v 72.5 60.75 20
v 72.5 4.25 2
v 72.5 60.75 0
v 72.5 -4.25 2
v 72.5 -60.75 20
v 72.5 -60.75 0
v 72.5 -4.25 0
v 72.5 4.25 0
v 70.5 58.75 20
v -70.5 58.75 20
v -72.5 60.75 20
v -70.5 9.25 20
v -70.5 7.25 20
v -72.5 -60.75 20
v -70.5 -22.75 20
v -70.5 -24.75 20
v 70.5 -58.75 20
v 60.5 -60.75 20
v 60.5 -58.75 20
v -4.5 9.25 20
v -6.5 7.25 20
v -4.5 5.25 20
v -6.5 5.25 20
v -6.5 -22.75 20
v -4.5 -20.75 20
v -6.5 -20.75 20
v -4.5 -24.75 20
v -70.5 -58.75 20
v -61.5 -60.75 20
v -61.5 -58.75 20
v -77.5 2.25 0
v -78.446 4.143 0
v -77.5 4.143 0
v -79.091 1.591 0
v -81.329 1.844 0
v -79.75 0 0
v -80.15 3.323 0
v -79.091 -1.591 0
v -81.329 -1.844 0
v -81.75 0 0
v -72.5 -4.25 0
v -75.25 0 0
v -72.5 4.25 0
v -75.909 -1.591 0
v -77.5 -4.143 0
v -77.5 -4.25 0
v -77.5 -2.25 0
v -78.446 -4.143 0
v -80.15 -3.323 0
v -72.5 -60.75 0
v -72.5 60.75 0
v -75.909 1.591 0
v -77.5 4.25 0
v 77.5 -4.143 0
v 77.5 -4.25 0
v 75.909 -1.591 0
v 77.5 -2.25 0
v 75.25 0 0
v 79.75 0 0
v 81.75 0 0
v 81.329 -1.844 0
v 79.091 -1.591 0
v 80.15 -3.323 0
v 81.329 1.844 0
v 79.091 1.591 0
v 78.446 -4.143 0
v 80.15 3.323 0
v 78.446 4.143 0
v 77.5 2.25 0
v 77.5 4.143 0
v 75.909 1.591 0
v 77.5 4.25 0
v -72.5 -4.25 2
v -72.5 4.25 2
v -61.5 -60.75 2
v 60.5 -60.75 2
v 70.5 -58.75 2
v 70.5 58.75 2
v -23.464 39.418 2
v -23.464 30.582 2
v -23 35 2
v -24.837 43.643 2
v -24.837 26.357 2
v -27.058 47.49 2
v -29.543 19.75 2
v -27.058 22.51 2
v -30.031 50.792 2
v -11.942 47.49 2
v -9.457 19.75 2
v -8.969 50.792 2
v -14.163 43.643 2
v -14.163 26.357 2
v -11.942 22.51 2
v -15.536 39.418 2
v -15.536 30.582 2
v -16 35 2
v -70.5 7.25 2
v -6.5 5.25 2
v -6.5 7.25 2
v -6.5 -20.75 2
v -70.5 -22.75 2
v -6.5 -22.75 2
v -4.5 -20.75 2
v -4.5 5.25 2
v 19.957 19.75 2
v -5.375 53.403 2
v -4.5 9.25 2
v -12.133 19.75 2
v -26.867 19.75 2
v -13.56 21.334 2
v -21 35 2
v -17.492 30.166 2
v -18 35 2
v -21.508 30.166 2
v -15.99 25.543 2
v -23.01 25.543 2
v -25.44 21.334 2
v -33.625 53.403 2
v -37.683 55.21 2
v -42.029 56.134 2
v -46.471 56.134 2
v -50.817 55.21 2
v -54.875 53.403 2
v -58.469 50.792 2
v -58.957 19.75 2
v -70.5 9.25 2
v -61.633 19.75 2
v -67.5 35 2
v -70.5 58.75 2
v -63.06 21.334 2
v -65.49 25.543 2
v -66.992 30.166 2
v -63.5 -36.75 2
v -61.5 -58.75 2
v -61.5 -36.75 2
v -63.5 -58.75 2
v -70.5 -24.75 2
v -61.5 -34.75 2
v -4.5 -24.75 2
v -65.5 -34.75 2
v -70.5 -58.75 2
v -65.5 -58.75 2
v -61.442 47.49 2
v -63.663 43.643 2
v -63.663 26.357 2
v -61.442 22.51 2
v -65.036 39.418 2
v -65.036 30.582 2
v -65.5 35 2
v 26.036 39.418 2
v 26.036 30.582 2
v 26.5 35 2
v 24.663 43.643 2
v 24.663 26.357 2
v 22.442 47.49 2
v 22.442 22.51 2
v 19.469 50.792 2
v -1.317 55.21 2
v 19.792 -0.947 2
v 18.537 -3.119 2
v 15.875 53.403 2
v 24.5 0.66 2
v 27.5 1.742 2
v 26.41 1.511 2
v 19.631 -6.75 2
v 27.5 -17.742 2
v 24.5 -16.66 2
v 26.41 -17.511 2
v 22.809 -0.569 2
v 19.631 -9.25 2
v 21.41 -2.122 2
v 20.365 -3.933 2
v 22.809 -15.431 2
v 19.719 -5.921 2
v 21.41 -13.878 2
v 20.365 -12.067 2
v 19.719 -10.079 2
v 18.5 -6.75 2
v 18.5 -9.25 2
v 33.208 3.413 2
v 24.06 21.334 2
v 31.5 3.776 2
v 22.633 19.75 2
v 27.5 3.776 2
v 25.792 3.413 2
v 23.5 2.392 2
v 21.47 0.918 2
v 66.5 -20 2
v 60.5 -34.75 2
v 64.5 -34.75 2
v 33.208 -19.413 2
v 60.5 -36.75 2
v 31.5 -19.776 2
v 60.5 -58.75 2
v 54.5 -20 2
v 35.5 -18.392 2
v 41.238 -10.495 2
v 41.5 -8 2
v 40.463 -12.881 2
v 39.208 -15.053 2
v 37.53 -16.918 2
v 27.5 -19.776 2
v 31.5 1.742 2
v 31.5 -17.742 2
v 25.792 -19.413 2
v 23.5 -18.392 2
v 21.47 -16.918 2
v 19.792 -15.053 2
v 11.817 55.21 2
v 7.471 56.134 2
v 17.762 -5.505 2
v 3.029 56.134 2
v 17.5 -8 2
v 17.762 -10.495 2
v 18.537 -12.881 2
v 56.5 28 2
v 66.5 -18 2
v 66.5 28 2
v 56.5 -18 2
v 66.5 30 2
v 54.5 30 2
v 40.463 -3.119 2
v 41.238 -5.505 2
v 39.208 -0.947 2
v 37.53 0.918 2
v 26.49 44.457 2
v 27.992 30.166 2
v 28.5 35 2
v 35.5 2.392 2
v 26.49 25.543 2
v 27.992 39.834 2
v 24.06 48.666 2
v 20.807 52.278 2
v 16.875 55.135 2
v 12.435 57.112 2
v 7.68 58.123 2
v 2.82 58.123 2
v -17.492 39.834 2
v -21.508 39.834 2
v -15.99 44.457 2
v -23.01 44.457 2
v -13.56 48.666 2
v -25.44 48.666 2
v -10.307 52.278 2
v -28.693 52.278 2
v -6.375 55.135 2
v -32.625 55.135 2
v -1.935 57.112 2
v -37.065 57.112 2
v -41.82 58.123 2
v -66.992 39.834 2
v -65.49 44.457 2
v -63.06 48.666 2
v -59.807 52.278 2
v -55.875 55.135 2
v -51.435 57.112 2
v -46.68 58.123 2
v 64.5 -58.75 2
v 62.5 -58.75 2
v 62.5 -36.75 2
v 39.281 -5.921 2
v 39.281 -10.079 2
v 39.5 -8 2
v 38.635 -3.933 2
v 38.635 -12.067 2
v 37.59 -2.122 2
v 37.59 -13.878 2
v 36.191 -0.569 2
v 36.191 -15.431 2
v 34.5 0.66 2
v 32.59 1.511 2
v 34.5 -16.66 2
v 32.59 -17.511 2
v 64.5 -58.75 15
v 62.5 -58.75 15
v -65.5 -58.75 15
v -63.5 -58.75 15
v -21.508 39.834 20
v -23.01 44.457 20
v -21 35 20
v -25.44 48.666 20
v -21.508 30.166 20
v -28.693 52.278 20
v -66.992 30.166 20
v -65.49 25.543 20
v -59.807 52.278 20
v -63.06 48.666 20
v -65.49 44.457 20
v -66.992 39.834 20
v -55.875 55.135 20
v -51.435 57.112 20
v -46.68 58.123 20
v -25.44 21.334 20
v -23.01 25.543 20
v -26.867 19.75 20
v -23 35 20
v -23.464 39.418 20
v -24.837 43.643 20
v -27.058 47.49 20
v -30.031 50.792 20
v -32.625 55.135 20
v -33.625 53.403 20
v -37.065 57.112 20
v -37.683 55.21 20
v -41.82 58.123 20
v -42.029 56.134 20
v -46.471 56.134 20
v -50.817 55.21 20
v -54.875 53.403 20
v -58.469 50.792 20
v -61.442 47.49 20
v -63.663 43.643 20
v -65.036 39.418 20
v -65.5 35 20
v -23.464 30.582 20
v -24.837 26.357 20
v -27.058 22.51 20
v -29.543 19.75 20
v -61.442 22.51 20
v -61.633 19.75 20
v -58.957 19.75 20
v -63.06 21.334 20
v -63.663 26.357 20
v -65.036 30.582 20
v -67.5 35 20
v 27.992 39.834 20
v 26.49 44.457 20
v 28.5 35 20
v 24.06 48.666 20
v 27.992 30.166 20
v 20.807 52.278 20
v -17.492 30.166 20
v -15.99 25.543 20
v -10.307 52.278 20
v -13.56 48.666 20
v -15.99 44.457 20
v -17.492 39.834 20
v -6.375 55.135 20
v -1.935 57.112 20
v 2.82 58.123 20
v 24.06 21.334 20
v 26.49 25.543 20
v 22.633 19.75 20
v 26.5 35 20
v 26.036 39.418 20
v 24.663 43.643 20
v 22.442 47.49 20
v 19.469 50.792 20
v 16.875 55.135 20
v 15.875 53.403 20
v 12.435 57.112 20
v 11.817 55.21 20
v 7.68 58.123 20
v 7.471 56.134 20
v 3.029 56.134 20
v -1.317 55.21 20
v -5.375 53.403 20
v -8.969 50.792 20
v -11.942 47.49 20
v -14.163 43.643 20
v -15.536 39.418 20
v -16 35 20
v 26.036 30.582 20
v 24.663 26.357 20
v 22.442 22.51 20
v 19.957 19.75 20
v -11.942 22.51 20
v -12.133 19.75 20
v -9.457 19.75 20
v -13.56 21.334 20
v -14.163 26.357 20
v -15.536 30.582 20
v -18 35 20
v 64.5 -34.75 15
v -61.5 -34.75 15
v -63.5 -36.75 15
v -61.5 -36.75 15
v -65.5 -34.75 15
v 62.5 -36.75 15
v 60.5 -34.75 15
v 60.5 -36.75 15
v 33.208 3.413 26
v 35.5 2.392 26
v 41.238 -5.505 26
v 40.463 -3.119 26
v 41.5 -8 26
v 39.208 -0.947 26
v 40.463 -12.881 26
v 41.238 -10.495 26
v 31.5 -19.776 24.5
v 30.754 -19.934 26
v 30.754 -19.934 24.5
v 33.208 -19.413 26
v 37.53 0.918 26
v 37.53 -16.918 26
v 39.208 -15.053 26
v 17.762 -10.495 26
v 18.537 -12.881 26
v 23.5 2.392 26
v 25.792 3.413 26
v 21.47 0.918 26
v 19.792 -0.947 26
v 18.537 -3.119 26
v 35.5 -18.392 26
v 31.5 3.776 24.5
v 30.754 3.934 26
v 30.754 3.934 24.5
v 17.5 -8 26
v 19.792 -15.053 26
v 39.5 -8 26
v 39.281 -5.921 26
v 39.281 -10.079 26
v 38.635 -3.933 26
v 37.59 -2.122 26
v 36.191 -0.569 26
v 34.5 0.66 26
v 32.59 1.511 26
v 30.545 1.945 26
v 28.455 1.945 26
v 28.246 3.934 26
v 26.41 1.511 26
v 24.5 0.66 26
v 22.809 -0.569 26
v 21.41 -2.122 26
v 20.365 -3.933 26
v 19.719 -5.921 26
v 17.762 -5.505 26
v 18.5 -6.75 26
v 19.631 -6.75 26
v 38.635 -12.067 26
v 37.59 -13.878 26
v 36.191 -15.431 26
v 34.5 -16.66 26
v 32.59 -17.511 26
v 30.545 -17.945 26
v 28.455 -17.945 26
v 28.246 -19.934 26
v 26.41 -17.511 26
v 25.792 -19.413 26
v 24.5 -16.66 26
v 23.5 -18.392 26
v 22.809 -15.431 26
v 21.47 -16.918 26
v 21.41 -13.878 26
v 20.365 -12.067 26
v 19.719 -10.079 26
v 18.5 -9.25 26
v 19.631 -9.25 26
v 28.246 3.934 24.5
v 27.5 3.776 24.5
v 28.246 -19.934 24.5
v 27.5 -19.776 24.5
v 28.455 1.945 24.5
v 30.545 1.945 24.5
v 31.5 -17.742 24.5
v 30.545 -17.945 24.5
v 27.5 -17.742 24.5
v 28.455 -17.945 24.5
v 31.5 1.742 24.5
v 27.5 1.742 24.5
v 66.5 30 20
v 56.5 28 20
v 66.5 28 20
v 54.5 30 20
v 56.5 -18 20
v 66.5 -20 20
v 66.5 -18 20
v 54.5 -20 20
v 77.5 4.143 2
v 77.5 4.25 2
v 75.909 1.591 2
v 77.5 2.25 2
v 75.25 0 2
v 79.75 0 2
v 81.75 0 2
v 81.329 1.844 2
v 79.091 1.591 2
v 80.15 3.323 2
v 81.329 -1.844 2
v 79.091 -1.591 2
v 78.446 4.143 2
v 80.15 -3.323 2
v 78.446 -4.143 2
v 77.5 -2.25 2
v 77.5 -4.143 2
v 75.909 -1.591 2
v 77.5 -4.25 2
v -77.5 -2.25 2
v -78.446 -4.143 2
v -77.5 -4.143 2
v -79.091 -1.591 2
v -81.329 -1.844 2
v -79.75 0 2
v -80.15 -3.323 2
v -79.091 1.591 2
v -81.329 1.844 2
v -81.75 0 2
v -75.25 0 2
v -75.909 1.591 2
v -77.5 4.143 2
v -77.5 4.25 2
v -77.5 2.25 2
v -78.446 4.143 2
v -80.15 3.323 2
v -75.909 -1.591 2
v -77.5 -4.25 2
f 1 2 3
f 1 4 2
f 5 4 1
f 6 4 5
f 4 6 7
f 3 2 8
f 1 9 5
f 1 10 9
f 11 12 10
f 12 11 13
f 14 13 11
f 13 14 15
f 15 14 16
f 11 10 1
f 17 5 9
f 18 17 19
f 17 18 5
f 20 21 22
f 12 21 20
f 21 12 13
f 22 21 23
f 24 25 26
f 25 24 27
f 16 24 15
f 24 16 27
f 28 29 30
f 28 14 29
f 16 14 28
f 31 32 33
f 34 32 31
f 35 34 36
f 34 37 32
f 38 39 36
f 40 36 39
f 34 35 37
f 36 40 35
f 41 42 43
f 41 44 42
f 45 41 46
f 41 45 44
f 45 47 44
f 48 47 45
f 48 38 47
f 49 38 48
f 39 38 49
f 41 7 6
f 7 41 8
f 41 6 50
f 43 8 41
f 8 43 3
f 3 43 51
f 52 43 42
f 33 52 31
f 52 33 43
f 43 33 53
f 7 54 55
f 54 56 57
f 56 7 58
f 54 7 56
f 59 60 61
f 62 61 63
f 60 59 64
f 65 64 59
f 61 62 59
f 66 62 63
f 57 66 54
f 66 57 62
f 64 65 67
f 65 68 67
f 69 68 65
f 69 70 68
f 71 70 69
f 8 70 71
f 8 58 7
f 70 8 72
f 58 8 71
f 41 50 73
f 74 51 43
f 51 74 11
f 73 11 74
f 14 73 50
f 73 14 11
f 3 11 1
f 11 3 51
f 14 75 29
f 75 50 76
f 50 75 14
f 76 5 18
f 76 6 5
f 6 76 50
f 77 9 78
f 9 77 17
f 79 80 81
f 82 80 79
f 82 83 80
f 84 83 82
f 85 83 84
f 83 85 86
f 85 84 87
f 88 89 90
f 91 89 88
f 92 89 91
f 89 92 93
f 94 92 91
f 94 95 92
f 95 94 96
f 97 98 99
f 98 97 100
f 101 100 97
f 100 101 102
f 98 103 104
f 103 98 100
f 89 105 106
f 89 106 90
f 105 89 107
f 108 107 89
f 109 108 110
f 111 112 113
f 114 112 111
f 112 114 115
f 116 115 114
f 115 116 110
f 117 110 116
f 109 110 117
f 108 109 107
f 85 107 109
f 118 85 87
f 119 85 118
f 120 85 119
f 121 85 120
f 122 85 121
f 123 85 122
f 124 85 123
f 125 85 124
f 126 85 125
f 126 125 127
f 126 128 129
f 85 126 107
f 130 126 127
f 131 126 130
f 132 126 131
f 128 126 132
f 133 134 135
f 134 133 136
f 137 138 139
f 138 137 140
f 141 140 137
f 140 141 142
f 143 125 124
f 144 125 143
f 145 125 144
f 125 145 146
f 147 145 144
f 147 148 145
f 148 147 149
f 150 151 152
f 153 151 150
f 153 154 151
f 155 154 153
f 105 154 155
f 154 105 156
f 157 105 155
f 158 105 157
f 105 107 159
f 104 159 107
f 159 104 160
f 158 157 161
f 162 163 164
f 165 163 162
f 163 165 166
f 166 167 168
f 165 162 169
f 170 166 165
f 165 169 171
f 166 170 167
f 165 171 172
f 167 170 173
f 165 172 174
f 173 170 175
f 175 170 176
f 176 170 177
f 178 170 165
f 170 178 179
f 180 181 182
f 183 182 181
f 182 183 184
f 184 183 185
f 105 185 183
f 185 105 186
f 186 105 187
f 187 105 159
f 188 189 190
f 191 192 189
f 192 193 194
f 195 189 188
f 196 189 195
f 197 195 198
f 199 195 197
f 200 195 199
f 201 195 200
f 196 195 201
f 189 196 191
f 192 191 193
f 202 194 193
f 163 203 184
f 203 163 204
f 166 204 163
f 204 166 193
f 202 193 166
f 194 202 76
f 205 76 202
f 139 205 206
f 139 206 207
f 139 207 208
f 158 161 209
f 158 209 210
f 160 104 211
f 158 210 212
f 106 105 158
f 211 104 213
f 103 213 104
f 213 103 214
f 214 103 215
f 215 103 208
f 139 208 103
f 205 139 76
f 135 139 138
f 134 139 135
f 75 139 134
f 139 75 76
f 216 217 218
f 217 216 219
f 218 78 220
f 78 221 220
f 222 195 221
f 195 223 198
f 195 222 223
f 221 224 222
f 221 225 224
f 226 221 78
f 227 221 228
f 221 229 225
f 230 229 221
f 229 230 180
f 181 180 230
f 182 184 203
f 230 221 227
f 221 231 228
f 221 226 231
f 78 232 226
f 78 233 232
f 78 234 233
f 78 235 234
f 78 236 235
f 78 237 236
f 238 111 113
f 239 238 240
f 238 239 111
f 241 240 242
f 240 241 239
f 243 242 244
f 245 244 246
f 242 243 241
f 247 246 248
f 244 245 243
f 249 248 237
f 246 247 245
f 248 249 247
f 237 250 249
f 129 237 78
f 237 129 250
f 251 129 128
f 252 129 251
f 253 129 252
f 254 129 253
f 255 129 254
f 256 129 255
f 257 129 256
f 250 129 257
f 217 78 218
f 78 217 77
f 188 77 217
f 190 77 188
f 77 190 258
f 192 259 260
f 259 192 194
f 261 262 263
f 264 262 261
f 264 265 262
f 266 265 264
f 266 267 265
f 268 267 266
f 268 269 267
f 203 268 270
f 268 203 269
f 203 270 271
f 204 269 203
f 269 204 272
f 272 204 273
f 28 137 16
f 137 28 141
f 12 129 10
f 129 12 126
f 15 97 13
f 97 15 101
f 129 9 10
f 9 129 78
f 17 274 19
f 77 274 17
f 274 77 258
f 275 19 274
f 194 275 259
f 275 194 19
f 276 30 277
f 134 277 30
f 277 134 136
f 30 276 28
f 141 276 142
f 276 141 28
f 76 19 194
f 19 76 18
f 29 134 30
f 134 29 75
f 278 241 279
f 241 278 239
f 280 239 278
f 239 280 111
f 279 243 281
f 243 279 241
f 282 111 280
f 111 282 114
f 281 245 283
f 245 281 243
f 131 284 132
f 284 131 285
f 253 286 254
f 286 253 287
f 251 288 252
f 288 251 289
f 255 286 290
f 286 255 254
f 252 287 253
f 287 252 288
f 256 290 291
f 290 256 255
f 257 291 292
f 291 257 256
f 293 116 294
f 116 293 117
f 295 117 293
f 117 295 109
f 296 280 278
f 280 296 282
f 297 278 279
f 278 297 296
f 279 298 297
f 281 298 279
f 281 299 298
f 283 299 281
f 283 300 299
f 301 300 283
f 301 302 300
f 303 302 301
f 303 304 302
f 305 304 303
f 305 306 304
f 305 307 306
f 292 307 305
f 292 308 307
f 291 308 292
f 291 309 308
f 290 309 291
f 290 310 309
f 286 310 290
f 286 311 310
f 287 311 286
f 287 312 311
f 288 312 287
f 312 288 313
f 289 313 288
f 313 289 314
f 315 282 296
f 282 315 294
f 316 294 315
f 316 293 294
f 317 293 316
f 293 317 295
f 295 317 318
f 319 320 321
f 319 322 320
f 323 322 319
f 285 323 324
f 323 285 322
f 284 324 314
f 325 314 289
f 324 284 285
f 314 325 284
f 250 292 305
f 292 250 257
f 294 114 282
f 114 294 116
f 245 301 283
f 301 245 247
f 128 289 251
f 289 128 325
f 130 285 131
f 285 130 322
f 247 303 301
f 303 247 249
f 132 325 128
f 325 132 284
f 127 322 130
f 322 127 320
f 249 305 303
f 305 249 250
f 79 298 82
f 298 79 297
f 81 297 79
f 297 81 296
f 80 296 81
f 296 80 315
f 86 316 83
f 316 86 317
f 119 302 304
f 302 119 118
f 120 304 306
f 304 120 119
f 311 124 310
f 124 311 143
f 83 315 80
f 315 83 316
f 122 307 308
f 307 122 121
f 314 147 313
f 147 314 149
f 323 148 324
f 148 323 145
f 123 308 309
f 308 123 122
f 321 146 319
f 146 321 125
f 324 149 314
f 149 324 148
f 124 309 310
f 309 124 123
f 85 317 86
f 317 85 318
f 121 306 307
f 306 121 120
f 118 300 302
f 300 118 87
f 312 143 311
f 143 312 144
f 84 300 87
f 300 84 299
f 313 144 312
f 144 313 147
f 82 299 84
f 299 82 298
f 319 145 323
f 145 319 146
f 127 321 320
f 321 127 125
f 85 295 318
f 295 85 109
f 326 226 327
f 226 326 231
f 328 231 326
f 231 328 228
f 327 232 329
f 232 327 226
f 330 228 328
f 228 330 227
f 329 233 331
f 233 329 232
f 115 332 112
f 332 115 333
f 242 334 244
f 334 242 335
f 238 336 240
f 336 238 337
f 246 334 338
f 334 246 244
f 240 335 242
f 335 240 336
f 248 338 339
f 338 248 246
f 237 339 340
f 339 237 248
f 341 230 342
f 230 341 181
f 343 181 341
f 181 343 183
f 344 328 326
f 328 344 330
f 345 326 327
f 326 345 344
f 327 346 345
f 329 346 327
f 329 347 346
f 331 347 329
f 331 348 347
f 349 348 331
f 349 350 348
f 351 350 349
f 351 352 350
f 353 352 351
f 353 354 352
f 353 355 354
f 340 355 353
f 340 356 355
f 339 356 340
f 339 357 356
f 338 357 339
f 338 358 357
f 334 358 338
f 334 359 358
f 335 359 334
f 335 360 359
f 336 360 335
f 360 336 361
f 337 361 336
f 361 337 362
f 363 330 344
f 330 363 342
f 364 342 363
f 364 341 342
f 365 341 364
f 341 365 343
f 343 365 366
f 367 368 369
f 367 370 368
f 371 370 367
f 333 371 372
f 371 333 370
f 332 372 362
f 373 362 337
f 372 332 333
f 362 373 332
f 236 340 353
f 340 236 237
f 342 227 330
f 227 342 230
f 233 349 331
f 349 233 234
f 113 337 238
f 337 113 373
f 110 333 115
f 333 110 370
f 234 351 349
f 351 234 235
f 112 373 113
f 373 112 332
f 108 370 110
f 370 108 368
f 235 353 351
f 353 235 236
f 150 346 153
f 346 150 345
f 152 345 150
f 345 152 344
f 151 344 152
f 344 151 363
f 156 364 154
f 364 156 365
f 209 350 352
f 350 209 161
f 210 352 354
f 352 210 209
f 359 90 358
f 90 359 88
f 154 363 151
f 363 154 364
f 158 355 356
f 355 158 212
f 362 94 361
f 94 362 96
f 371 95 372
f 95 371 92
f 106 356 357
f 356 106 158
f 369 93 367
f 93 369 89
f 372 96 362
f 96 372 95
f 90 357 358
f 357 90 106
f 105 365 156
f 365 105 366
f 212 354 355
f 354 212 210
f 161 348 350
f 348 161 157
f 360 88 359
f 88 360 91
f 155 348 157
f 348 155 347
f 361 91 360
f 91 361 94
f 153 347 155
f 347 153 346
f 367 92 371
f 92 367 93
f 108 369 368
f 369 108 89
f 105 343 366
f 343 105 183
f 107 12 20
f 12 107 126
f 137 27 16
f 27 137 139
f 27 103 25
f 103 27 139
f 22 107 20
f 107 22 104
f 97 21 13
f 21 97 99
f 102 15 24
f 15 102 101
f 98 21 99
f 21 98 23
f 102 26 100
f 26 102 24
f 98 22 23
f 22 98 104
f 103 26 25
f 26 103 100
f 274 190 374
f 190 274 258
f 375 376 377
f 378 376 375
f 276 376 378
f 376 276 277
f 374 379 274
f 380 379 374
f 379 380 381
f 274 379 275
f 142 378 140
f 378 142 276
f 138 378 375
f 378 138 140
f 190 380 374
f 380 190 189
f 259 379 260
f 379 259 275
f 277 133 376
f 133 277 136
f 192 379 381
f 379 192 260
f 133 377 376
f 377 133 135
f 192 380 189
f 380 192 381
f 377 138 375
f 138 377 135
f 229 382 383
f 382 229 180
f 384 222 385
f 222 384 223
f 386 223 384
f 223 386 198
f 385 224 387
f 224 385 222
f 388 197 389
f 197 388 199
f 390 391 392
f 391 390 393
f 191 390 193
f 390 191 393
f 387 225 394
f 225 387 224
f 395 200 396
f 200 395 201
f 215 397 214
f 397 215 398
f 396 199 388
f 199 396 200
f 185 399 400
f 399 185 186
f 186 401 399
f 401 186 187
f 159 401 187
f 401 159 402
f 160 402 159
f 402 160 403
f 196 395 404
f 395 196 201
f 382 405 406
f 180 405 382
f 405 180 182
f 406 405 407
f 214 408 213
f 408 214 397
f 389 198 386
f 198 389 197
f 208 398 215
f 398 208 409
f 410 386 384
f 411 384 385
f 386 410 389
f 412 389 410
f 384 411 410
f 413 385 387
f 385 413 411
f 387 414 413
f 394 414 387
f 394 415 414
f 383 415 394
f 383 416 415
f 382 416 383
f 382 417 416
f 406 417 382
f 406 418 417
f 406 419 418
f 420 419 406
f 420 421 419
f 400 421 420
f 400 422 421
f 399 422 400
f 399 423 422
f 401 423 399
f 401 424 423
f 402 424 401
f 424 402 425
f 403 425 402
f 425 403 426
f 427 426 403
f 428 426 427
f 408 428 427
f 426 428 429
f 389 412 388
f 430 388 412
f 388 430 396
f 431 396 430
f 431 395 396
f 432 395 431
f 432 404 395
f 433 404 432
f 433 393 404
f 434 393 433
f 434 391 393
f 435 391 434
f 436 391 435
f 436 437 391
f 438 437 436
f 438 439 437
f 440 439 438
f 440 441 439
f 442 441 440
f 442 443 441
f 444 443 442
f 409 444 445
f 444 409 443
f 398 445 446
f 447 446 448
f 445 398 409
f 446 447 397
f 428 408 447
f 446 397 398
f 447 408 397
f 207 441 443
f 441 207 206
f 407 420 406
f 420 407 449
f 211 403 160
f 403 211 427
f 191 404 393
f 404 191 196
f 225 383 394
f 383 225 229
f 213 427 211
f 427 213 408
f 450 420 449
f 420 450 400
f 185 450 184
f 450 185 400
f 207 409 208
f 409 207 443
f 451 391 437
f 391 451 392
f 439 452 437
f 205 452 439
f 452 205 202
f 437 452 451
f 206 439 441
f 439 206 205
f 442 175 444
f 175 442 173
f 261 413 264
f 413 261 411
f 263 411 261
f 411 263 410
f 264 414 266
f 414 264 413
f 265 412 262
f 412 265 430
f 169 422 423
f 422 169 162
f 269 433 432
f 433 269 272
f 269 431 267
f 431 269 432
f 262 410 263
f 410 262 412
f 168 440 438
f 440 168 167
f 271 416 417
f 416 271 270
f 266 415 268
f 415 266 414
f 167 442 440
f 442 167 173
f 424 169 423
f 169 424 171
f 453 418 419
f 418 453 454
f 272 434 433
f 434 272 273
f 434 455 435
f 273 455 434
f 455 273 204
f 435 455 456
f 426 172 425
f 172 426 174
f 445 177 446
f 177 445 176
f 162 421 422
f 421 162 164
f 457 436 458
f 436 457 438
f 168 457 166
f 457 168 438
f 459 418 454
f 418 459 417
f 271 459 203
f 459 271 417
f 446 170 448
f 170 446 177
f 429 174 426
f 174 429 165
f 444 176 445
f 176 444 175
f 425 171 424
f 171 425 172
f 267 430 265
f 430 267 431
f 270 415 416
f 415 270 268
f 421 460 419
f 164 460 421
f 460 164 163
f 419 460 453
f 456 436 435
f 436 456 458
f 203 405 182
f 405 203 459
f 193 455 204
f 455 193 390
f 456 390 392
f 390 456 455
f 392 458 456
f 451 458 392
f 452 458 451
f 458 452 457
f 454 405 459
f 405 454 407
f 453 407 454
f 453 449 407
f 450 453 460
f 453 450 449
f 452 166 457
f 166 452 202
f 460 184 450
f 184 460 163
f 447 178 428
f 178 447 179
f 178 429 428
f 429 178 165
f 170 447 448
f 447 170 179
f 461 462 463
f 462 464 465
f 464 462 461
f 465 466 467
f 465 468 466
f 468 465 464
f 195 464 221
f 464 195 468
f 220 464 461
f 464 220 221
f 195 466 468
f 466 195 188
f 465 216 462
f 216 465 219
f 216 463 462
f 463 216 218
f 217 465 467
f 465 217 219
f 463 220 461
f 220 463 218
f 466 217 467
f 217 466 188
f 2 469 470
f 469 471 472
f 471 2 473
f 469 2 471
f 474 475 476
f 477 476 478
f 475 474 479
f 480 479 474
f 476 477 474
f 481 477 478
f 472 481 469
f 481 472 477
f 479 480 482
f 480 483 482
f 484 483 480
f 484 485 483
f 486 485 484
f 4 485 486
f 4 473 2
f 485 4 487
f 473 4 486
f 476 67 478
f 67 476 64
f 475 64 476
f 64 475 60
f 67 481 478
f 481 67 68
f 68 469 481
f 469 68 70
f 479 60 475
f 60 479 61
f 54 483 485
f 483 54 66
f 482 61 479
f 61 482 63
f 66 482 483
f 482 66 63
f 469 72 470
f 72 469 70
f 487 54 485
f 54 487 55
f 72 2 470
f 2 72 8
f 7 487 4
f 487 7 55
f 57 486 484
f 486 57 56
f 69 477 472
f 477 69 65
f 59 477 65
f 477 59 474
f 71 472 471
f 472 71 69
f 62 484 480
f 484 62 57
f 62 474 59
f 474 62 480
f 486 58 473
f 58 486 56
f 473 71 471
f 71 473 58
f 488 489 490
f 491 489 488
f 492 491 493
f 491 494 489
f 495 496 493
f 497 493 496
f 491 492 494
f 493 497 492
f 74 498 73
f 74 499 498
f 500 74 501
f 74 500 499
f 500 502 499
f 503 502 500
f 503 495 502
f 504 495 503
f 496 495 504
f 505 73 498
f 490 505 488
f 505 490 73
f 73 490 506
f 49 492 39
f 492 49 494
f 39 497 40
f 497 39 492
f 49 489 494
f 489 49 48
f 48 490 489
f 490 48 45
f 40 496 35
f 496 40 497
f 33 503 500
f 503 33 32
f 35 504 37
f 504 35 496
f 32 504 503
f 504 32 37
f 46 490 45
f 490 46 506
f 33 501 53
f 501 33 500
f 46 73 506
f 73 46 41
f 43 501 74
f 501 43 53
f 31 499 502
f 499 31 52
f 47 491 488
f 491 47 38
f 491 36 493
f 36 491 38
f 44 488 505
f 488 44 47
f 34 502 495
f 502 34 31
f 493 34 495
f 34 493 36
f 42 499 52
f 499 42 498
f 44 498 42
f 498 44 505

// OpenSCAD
shelly_d = 42.5;
shelly_r = shelly_d / 2;
shelly_h = 20;
shelly_cut = 8;
power_w = 30;
power_l = 66;
power_h = 20;
spacing = 5;
shell = 2;
terminal_l = 126;
terminal_w = 22;
terminal_h = 15;
usb_l = 46;
usb_w = 14;
usb_cut = 4;
usb_h = shelly_h;

switch_d = 20;
switch_r = switch_d / 2;
switch_outer_r = switch_r + shell;
switch_outer_d = switch_outer_r * 2;
switch_cut = 4;
box_h = shelly_h;
switch_h = 26;
switch_notch_w = 2.5;
switch_notch_t = 1;
screw_d = 4.5;
screw_r = screw_d / 2;

//box_inner_l = shelly_d * 2 + spacing + 3 + shell * 5 + power_w;
box_inner_l = terminal_l + spacing * 3;
//box_inner_w = shelly_d + spacing + terminal_w;
box_inner_w = power_w + shelly_d - shelly_cut + terminal_w + spacing * 5 + shell * 3;

box_outer_l = box_inner_l + shell * 2;
box_outer_w = box_inner_w + shell * 2;

module switch() {
    translate([switch_outer_r + shell, switch_outer_r + shell, 0])
    difference() {
        cylinder(r = switch_outer_r, h = switch_h);
        cylinder(r = switch_r, h = switch_h + 1);
        translate([-switch_cut / 2, -switch_d, 0])
        cube([switch_cut, switch_d * 2, switch_h - 1.5]);
        translate([-switch_r - switch_notch_t, -switch_notch_w / 2, 0])
        cube([switch_notch_t * 2, switch_notch_w, switch_h * 2]);
    }
}

module box() {
  difference() {
    cube([box_outer_l, box_outer_w, box_h]);
    translate([shell, shell, shell])
    cube([box_inner_l, box_inner_w, box_h]);
    
    translate([shell * 3 + spacing, -0.1, shell]) 
    cube([terminal_l - shell * 2, shell * 2, box_h]);
  }
}

module shelly() {
    difference() {
        cylinder(h=shelly_h, r=shelly_r + shell);
        translate([0, 0, shell])
        cylinder(h=shelly_h, r=shelly_r);
        
    translate([-shelly_d, -shelly_r - shell, 0])
        cube([shelly_d * 2, shelly_cut, shelly_h + 1]);
    }
}

module power() {
    difference() {
        translate([0, -shell, 0])
        cube([power_w + shell * 2, power_l + shell, power_h]);
        translate([shell, 0, 0])
        cube([power_w, power_l + 2, power_h + 1]);
        translate([shell * 2, -power_l, 0])
        cube([power_w - shell * 2, power_l * 2, power_h + 1]);
    }
}

module terminal() {
    difference() {
        cube([terminal_l + shell * 2 , terminal_w + shell * 2, terminal_h]);
        translate([shell, -1, 0])
        cube([terminal_l, terminal_w + shell + 1, terminal_h + 1]);
        translate([shell * 2, -1, 0])
        cube([terminal_l - shell * 2, terminal_w + shell * 4, terminal_h + 1]);
    }
}

module usb() {
    difference() {
        cube([usb_w + shell * 2, usb_l + shell * 2, usb_h]);
        translate([shell, shell, 0])
        cube([usb_w, usb_l, usb_h * 2]);
        translate([usb_w - shell, -1, 0])
        cube([usb_cut, usb_l * 2, usb_h * 2]); 
    }
}

module screw_tab() {
    difference() {
        union() {
            translate([spacing, screw_r + shell, 0])
            cylinder(r=screw_r + shell, shell);
            cube([spacing, screw_d + + shell * 2, shell]);
        }
        
        translate([spacing, shell + screw_r, -1])
        cylinder(r=screw_r, h = shell + 2);
    }
}

translate([-box_outer_l / 2, -box_outer_w / 2, 0]) {
box();
translate([shelly_r + shell + spacing, terminal_w + power_w + shelly_r + shell * 4 + spacing * 4.5 - shelly_cut, 0]){
    shelly();
    translate([shelly_d + spacing + shell, 0, 0])
    shelly();
}


translate([power_l, terminal_w + shell * 2 + spacing * 2, 0])
rotate([0, 0, 90])
power();

translate([shell + spacing, 0, 0])
terminal();

translate([box_inner_l - switch_outer_d - spacing * 3 - usb_w, box_inner_w / 2 - switch_r - spacing * 2, 0])
switch();

translate([box_inner_l - usb_w, (box_inner_w - usb_l) / 2 + spacing, 0])
usb();

translate([box_outer_l, box_outer_w / 2 - screw_r - shell, 0])
screw_tab();

translate([0, box_outer_w / 2 + screw_r + shell, 0])
rotate([0, 0, 180])
screw_tab();
}
